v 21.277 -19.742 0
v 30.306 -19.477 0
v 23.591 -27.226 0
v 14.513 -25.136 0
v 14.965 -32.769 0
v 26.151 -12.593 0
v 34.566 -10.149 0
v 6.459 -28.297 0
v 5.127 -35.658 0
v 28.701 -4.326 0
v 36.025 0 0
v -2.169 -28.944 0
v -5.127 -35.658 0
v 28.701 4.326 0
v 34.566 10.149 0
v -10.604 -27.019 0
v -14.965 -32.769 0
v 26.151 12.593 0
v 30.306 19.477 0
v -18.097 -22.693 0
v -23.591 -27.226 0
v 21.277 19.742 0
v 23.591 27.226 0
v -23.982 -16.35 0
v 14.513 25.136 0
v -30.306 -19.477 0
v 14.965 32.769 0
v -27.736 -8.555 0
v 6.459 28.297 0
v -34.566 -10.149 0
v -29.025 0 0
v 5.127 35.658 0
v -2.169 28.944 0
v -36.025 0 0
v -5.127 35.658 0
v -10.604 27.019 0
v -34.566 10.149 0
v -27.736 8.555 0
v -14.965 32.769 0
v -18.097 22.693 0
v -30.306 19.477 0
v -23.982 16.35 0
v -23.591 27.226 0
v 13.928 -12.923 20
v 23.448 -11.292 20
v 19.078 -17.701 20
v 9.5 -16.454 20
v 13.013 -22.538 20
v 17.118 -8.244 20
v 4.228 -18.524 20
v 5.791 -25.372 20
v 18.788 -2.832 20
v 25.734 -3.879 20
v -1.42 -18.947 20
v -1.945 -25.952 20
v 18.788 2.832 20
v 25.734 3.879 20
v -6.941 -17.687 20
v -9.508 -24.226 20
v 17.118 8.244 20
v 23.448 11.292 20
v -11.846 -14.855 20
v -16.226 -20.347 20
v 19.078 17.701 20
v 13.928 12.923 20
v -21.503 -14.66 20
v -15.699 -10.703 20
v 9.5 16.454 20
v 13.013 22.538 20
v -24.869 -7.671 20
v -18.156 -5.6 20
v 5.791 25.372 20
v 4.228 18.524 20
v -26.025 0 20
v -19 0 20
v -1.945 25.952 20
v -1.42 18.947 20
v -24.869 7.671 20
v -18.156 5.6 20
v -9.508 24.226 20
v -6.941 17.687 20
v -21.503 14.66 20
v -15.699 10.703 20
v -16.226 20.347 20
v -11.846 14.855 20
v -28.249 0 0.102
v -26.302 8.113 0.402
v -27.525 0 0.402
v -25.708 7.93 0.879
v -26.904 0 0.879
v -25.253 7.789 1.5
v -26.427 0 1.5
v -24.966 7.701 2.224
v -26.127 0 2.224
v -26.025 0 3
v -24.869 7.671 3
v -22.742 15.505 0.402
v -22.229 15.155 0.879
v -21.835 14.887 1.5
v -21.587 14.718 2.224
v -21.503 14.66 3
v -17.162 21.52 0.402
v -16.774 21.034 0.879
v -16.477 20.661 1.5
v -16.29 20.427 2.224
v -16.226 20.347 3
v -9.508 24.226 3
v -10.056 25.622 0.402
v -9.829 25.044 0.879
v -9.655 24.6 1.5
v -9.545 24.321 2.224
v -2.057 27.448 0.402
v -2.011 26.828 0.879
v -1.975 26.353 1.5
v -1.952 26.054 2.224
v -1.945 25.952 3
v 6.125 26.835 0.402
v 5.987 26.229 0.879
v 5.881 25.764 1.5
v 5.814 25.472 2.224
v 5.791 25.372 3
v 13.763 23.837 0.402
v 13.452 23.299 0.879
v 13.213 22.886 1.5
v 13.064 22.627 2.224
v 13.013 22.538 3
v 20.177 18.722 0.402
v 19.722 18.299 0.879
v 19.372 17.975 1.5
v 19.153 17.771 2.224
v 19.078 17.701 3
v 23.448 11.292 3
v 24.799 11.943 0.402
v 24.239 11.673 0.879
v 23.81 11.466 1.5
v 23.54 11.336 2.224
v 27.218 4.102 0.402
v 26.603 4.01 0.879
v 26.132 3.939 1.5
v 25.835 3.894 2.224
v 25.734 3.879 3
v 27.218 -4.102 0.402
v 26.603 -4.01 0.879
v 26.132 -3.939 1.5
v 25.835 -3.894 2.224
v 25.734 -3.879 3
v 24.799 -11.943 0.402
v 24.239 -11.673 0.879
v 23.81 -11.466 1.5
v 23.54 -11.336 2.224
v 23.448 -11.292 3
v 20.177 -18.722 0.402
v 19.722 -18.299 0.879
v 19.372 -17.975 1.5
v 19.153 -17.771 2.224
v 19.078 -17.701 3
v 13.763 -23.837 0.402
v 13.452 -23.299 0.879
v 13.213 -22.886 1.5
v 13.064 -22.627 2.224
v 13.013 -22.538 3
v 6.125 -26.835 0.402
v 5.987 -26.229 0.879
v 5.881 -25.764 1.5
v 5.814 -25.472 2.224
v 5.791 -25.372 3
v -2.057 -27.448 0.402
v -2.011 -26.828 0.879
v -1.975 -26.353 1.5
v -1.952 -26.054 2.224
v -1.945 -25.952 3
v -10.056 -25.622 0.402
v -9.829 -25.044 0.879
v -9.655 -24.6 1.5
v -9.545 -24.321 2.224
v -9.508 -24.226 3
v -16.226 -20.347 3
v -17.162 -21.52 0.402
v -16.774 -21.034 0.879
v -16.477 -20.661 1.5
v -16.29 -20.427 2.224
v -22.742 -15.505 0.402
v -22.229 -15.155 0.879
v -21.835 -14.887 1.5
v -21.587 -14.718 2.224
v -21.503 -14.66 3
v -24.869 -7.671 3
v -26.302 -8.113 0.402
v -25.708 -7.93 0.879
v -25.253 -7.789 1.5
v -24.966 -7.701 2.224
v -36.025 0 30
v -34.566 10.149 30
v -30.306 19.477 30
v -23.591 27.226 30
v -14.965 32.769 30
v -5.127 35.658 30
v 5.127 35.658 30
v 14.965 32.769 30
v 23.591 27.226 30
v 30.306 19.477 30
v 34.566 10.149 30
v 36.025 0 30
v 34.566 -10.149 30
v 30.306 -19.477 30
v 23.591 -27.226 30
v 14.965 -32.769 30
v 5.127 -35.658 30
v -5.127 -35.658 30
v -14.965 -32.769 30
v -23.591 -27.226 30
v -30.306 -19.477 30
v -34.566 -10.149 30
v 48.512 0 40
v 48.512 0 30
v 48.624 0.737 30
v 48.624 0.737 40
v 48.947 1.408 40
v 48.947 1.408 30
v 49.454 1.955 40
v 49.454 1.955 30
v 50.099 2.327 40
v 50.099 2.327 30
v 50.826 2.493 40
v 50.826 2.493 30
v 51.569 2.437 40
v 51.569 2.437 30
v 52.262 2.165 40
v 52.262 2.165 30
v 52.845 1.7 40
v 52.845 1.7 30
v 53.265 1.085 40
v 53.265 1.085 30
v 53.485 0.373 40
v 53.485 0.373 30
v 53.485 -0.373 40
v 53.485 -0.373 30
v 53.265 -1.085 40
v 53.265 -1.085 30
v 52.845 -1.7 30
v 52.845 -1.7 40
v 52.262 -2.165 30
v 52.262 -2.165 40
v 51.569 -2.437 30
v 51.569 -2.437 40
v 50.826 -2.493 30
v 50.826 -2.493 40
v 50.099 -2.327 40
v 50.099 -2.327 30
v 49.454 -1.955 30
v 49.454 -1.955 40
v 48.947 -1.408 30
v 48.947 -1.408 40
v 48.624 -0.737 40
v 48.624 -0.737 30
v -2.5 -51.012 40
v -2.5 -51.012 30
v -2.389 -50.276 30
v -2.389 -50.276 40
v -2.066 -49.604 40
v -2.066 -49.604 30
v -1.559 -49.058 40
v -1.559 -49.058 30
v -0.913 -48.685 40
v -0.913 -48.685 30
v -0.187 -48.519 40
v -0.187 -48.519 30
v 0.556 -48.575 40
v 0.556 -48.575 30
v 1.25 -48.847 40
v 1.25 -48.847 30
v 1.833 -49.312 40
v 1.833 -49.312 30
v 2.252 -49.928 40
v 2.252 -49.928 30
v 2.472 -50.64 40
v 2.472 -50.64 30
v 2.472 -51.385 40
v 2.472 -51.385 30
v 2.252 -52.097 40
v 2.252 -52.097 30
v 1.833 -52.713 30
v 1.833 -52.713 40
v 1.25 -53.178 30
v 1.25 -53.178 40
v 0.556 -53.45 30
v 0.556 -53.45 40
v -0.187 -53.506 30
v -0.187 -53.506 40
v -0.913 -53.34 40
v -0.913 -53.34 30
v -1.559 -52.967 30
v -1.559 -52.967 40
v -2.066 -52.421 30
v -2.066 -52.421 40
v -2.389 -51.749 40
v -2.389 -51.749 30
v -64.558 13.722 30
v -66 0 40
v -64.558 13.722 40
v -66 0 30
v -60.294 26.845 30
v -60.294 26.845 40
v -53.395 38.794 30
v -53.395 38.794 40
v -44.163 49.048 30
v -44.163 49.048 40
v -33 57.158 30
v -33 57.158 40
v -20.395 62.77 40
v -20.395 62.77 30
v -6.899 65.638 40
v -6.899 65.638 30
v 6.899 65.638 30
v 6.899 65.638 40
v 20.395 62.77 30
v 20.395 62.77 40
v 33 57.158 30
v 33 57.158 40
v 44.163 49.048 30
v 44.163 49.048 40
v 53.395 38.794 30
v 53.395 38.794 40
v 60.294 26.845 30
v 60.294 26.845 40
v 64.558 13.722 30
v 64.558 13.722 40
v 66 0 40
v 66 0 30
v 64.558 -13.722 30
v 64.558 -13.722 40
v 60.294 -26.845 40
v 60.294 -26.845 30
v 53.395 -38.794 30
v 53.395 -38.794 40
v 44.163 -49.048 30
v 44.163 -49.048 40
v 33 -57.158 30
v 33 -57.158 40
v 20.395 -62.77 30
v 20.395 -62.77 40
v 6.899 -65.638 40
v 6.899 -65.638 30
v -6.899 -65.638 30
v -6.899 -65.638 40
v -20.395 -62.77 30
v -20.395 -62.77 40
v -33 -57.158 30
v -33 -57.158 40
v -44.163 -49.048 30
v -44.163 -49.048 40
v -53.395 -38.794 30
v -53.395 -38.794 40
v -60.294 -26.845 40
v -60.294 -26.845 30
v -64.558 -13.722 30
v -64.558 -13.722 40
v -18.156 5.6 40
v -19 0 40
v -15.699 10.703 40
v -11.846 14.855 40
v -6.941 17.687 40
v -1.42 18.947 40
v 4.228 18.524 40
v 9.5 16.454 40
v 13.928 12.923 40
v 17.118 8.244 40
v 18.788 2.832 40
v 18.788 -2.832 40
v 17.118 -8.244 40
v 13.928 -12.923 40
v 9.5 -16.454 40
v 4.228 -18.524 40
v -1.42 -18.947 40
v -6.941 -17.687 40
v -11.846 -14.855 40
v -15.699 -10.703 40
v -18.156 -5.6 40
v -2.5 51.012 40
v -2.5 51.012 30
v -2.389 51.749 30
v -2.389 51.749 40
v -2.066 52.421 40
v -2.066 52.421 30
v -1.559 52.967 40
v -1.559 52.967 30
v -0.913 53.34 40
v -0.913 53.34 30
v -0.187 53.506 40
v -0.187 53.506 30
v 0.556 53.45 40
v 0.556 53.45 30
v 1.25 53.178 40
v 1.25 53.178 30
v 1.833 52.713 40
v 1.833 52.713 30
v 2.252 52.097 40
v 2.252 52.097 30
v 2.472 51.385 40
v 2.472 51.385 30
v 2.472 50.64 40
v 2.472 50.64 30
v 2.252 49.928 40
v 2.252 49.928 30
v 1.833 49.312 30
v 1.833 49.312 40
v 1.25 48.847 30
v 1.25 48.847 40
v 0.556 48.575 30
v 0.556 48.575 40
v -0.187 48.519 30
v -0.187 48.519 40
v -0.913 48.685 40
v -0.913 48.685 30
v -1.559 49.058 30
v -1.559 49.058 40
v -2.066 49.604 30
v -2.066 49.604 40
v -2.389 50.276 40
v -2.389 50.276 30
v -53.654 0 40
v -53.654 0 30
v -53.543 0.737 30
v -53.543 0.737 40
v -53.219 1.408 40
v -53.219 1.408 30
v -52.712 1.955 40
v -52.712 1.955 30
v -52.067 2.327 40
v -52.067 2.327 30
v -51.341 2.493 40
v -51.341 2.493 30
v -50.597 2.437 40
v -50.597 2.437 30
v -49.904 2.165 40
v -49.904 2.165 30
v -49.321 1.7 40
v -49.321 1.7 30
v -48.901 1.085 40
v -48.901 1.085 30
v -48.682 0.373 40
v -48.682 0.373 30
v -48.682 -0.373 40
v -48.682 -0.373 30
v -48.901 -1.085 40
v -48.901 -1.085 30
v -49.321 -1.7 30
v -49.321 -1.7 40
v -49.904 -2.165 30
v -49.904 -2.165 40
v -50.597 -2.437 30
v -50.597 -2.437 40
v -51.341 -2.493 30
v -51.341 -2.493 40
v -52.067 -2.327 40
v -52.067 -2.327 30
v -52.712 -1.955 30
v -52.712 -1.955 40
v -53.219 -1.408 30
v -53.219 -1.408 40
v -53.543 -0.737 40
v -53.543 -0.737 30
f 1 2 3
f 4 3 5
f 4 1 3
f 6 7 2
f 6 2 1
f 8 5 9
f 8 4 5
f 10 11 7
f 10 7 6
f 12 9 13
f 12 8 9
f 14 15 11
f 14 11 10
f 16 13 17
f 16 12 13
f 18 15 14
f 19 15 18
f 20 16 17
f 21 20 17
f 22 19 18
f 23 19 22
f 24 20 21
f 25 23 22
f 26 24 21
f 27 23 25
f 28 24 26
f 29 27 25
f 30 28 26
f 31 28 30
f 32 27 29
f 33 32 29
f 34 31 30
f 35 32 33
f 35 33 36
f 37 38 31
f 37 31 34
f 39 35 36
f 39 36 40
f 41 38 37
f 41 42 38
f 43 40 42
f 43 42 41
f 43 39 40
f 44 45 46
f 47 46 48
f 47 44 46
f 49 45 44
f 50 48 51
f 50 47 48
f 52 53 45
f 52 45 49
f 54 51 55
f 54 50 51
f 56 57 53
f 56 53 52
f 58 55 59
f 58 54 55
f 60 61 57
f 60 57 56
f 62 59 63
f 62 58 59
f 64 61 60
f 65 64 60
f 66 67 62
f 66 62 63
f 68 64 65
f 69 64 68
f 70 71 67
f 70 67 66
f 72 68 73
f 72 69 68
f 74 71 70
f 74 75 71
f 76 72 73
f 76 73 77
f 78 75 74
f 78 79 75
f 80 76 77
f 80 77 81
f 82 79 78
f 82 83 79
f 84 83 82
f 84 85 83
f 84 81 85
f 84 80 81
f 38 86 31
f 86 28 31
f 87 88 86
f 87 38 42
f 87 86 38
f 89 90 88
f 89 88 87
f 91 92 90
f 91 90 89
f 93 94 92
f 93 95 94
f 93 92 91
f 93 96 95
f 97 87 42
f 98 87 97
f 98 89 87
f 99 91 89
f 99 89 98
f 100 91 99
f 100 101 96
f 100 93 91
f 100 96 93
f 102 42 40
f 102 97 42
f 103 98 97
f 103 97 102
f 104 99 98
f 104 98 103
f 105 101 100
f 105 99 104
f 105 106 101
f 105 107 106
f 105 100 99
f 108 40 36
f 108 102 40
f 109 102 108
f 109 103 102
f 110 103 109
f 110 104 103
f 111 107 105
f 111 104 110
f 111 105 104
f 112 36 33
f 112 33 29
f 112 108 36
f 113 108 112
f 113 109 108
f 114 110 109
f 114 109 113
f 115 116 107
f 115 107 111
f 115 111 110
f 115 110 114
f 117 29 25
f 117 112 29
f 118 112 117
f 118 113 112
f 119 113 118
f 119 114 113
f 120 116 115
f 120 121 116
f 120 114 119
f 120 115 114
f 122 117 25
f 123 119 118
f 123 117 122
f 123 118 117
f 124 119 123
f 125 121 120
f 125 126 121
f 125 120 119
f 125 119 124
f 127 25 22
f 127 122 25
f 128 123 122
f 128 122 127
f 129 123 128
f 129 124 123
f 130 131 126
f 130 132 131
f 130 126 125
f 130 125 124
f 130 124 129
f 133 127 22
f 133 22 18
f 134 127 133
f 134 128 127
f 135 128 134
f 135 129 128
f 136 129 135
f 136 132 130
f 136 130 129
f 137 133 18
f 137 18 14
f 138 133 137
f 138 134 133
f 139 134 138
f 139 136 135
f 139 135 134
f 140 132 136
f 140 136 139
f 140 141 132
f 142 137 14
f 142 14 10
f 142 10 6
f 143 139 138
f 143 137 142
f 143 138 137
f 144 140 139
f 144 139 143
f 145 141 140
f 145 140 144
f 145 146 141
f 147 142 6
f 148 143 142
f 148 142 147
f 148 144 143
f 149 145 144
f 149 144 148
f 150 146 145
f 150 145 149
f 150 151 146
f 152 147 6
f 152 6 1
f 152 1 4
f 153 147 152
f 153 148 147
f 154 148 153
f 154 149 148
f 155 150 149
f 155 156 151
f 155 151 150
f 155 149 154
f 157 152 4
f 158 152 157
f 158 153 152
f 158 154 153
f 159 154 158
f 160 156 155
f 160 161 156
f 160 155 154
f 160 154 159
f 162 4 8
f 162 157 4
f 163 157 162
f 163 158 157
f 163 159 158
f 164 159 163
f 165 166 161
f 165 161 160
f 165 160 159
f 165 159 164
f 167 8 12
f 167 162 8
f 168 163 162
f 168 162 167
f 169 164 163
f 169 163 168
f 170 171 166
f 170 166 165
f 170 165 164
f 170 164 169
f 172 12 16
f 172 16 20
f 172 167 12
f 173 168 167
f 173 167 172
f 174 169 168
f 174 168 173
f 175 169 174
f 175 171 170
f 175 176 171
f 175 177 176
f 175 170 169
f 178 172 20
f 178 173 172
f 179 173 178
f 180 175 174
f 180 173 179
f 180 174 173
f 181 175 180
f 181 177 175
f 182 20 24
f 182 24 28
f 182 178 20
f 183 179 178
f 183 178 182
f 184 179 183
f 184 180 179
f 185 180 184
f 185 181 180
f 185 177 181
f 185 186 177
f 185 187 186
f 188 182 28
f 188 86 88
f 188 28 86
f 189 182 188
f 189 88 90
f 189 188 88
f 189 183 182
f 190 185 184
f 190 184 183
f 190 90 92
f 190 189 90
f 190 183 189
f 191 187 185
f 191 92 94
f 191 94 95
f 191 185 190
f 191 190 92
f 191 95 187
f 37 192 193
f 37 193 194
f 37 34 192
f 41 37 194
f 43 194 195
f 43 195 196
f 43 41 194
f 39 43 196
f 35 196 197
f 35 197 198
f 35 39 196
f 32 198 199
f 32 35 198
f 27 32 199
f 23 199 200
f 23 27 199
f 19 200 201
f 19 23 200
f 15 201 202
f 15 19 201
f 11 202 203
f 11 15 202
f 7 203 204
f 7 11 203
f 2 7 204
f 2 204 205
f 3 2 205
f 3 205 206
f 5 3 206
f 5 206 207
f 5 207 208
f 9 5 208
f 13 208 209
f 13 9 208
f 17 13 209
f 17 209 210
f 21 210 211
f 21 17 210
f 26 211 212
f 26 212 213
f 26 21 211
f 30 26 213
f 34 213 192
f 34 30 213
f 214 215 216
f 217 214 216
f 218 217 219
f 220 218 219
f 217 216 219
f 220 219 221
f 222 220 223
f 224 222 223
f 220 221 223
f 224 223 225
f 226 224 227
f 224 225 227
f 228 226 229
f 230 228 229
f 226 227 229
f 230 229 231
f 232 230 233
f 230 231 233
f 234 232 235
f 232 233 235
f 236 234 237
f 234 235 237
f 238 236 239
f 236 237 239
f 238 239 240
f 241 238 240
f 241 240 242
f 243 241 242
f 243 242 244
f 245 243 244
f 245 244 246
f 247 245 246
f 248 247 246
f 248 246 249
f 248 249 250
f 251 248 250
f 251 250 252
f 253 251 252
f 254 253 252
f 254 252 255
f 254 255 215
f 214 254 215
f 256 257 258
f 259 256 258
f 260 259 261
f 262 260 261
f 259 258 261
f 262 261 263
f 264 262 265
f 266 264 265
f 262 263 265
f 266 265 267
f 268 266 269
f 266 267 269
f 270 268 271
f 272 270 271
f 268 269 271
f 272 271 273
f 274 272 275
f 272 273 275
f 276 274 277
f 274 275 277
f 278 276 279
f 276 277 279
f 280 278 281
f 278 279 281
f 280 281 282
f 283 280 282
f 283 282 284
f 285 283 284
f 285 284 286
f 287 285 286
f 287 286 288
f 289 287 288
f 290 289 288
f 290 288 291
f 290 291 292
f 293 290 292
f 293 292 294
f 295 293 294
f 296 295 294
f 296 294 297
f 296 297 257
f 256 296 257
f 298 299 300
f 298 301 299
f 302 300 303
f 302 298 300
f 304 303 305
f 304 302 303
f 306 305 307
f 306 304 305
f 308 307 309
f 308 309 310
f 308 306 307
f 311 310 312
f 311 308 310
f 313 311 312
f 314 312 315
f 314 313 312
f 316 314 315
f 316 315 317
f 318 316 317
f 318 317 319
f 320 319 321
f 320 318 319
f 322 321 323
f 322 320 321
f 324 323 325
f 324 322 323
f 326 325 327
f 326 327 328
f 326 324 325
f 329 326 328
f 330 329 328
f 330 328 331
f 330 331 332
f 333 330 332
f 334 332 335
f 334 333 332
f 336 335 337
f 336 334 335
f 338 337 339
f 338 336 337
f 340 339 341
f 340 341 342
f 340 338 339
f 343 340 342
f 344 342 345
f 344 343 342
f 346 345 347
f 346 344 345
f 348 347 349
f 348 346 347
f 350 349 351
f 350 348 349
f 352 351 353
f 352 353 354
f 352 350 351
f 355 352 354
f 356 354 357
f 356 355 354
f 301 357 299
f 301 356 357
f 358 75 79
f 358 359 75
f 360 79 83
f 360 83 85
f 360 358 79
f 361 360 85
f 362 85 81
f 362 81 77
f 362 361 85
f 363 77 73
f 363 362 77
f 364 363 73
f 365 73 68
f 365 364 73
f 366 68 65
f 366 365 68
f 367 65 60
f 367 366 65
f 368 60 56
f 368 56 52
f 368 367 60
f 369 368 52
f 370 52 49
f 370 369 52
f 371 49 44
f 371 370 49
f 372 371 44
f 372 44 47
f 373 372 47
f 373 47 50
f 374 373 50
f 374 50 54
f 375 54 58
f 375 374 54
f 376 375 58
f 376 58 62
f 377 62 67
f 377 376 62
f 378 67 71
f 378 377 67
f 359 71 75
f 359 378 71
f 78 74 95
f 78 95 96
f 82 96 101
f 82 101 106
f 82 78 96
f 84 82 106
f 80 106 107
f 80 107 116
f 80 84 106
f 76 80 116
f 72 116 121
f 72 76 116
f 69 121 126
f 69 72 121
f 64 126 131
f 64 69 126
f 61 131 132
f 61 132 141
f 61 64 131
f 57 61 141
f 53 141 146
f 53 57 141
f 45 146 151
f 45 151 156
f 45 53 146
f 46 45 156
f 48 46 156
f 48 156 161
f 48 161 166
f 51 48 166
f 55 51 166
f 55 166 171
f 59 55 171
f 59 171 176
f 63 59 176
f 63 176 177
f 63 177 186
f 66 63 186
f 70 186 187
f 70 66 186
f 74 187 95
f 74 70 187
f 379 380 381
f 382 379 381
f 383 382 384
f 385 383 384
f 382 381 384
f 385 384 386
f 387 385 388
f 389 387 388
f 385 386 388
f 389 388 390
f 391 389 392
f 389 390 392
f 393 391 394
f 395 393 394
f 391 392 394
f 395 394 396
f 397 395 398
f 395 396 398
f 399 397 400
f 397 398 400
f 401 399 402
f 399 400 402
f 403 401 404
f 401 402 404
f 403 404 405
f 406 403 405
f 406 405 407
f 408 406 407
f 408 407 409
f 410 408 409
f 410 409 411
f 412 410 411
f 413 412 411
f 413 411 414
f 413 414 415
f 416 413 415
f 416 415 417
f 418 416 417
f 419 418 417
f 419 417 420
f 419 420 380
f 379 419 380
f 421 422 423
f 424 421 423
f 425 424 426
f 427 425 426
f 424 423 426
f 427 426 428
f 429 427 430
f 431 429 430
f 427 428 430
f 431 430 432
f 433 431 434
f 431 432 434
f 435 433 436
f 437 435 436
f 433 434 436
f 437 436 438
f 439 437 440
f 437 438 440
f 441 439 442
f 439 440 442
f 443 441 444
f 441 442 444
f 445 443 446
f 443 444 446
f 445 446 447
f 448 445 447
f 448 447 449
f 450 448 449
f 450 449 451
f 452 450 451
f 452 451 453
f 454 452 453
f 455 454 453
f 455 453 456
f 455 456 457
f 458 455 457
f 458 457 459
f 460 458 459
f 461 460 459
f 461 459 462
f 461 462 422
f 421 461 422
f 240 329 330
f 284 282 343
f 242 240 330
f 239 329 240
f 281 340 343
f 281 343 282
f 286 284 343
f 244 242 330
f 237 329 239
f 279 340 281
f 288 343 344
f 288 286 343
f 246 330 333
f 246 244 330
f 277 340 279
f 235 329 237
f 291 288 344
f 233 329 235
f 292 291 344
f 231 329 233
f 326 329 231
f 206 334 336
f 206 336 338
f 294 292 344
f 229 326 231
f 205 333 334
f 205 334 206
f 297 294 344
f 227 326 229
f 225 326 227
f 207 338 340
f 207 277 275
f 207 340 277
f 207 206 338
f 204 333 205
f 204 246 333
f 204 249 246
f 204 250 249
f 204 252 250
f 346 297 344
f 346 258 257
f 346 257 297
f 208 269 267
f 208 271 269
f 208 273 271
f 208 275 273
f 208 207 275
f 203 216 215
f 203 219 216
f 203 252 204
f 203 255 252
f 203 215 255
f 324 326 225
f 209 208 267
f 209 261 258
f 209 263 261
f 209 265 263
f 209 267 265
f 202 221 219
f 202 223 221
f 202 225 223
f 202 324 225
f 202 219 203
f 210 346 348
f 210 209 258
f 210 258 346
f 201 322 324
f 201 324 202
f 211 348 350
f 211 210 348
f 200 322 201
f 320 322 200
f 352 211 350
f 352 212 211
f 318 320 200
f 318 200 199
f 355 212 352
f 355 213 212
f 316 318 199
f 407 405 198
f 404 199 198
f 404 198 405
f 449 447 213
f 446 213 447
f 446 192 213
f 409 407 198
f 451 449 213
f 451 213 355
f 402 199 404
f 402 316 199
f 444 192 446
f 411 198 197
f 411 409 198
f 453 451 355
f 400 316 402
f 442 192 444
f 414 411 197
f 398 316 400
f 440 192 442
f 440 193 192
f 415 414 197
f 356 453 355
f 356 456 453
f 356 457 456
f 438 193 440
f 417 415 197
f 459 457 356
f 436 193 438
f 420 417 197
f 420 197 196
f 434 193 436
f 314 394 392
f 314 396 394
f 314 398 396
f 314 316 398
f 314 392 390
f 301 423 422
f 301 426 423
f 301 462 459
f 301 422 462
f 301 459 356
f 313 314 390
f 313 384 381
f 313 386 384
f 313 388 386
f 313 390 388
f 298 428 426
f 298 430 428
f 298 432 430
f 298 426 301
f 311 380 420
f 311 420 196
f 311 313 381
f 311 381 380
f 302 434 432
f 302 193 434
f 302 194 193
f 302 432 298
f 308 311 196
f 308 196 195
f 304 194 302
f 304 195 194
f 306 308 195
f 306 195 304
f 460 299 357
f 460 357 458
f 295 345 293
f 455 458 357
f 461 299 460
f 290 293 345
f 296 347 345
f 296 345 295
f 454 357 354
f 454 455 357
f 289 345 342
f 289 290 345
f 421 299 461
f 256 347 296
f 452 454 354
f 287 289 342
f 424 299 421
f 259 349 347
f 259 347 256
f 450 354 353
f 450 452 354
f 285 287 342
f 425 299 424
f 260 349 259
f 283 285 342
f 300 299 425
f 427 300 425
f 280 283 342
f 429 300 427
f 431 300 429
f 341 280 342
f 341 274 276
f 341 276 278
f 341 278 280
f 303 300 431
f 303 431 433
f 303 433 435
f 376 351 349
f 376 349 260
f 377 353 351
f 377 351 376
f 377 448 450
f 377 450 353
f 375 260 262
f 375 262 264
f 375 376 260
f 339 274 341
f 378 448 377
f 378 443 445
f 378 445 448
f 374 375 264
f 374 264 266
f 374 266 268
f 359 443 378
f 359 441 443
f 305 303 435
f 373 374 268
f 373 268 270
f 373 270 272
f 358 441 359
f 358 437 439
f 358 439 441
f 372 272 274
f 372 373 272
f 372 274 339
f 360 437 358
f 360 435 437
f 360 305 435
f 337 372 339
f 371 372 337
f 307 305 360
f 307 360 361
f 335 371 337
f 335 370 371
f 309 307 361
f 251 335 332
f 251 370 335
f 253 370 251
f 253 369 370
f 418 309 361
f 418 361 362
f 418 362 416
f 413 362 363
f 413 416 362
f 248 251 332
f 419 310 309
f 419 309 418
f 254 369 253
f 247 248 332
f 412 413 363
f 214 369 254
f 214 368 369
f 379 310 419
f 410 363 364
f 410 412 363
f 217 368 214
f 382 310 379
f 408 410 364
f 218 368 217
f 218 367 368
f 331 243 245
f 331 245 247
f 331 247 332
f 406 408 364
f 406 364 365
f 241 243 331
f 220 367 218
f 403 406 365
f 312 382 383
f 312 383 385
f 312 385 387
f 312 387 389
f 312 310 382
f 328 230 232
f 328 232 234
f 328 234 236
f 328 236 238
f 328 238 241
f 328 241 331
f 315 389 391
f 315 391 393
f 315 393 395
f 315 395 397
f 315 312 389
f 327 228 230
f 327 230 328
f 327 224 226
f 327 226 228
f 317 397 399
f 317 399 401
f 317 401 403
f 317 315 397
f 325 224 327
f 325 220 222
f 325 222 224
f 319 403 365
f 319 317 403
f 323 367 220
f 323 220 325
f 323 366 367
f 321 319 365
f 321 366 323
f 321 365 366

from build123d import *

# Parameters (mm, degrees)
F5_D = 5
F6_R = 3
F8_D = 5


with BuildPart() as f1:
    # F0 (on Front) → F1 (revolve)
    with BuildSketch(Plane.XZ):
        Polygon((-36.025, 0), (-26.025, 0), (-26.025, 20), (-19, 20), (-19, 40), (-66, 40), (-66, 30), (-36.025, 30), align=None)
    revolve(axis=Axis((0, 0, -7.200188), (0, 0, -1)))

    # F5 (through all)
    with Locations(Plane.XY.offset(40)):
        with Locations((0, 51.0125), (0, -51.0125)):
            Hole(F5_D / 2)

    # F6
    f6_edges = [f1.edges().sort_by_distance(p)[0] for p in [
        (26.025, 0, 0),
    ]]
    fillet(f6_edges, radius=F6_R)

    # F8 (through all)
    with Locations(Plane.XY.offset(40)):
        with Locations((51.0125, 0), (-51.153772, 0)):
            Hole(F8_D / 2)


solid = f1.part
